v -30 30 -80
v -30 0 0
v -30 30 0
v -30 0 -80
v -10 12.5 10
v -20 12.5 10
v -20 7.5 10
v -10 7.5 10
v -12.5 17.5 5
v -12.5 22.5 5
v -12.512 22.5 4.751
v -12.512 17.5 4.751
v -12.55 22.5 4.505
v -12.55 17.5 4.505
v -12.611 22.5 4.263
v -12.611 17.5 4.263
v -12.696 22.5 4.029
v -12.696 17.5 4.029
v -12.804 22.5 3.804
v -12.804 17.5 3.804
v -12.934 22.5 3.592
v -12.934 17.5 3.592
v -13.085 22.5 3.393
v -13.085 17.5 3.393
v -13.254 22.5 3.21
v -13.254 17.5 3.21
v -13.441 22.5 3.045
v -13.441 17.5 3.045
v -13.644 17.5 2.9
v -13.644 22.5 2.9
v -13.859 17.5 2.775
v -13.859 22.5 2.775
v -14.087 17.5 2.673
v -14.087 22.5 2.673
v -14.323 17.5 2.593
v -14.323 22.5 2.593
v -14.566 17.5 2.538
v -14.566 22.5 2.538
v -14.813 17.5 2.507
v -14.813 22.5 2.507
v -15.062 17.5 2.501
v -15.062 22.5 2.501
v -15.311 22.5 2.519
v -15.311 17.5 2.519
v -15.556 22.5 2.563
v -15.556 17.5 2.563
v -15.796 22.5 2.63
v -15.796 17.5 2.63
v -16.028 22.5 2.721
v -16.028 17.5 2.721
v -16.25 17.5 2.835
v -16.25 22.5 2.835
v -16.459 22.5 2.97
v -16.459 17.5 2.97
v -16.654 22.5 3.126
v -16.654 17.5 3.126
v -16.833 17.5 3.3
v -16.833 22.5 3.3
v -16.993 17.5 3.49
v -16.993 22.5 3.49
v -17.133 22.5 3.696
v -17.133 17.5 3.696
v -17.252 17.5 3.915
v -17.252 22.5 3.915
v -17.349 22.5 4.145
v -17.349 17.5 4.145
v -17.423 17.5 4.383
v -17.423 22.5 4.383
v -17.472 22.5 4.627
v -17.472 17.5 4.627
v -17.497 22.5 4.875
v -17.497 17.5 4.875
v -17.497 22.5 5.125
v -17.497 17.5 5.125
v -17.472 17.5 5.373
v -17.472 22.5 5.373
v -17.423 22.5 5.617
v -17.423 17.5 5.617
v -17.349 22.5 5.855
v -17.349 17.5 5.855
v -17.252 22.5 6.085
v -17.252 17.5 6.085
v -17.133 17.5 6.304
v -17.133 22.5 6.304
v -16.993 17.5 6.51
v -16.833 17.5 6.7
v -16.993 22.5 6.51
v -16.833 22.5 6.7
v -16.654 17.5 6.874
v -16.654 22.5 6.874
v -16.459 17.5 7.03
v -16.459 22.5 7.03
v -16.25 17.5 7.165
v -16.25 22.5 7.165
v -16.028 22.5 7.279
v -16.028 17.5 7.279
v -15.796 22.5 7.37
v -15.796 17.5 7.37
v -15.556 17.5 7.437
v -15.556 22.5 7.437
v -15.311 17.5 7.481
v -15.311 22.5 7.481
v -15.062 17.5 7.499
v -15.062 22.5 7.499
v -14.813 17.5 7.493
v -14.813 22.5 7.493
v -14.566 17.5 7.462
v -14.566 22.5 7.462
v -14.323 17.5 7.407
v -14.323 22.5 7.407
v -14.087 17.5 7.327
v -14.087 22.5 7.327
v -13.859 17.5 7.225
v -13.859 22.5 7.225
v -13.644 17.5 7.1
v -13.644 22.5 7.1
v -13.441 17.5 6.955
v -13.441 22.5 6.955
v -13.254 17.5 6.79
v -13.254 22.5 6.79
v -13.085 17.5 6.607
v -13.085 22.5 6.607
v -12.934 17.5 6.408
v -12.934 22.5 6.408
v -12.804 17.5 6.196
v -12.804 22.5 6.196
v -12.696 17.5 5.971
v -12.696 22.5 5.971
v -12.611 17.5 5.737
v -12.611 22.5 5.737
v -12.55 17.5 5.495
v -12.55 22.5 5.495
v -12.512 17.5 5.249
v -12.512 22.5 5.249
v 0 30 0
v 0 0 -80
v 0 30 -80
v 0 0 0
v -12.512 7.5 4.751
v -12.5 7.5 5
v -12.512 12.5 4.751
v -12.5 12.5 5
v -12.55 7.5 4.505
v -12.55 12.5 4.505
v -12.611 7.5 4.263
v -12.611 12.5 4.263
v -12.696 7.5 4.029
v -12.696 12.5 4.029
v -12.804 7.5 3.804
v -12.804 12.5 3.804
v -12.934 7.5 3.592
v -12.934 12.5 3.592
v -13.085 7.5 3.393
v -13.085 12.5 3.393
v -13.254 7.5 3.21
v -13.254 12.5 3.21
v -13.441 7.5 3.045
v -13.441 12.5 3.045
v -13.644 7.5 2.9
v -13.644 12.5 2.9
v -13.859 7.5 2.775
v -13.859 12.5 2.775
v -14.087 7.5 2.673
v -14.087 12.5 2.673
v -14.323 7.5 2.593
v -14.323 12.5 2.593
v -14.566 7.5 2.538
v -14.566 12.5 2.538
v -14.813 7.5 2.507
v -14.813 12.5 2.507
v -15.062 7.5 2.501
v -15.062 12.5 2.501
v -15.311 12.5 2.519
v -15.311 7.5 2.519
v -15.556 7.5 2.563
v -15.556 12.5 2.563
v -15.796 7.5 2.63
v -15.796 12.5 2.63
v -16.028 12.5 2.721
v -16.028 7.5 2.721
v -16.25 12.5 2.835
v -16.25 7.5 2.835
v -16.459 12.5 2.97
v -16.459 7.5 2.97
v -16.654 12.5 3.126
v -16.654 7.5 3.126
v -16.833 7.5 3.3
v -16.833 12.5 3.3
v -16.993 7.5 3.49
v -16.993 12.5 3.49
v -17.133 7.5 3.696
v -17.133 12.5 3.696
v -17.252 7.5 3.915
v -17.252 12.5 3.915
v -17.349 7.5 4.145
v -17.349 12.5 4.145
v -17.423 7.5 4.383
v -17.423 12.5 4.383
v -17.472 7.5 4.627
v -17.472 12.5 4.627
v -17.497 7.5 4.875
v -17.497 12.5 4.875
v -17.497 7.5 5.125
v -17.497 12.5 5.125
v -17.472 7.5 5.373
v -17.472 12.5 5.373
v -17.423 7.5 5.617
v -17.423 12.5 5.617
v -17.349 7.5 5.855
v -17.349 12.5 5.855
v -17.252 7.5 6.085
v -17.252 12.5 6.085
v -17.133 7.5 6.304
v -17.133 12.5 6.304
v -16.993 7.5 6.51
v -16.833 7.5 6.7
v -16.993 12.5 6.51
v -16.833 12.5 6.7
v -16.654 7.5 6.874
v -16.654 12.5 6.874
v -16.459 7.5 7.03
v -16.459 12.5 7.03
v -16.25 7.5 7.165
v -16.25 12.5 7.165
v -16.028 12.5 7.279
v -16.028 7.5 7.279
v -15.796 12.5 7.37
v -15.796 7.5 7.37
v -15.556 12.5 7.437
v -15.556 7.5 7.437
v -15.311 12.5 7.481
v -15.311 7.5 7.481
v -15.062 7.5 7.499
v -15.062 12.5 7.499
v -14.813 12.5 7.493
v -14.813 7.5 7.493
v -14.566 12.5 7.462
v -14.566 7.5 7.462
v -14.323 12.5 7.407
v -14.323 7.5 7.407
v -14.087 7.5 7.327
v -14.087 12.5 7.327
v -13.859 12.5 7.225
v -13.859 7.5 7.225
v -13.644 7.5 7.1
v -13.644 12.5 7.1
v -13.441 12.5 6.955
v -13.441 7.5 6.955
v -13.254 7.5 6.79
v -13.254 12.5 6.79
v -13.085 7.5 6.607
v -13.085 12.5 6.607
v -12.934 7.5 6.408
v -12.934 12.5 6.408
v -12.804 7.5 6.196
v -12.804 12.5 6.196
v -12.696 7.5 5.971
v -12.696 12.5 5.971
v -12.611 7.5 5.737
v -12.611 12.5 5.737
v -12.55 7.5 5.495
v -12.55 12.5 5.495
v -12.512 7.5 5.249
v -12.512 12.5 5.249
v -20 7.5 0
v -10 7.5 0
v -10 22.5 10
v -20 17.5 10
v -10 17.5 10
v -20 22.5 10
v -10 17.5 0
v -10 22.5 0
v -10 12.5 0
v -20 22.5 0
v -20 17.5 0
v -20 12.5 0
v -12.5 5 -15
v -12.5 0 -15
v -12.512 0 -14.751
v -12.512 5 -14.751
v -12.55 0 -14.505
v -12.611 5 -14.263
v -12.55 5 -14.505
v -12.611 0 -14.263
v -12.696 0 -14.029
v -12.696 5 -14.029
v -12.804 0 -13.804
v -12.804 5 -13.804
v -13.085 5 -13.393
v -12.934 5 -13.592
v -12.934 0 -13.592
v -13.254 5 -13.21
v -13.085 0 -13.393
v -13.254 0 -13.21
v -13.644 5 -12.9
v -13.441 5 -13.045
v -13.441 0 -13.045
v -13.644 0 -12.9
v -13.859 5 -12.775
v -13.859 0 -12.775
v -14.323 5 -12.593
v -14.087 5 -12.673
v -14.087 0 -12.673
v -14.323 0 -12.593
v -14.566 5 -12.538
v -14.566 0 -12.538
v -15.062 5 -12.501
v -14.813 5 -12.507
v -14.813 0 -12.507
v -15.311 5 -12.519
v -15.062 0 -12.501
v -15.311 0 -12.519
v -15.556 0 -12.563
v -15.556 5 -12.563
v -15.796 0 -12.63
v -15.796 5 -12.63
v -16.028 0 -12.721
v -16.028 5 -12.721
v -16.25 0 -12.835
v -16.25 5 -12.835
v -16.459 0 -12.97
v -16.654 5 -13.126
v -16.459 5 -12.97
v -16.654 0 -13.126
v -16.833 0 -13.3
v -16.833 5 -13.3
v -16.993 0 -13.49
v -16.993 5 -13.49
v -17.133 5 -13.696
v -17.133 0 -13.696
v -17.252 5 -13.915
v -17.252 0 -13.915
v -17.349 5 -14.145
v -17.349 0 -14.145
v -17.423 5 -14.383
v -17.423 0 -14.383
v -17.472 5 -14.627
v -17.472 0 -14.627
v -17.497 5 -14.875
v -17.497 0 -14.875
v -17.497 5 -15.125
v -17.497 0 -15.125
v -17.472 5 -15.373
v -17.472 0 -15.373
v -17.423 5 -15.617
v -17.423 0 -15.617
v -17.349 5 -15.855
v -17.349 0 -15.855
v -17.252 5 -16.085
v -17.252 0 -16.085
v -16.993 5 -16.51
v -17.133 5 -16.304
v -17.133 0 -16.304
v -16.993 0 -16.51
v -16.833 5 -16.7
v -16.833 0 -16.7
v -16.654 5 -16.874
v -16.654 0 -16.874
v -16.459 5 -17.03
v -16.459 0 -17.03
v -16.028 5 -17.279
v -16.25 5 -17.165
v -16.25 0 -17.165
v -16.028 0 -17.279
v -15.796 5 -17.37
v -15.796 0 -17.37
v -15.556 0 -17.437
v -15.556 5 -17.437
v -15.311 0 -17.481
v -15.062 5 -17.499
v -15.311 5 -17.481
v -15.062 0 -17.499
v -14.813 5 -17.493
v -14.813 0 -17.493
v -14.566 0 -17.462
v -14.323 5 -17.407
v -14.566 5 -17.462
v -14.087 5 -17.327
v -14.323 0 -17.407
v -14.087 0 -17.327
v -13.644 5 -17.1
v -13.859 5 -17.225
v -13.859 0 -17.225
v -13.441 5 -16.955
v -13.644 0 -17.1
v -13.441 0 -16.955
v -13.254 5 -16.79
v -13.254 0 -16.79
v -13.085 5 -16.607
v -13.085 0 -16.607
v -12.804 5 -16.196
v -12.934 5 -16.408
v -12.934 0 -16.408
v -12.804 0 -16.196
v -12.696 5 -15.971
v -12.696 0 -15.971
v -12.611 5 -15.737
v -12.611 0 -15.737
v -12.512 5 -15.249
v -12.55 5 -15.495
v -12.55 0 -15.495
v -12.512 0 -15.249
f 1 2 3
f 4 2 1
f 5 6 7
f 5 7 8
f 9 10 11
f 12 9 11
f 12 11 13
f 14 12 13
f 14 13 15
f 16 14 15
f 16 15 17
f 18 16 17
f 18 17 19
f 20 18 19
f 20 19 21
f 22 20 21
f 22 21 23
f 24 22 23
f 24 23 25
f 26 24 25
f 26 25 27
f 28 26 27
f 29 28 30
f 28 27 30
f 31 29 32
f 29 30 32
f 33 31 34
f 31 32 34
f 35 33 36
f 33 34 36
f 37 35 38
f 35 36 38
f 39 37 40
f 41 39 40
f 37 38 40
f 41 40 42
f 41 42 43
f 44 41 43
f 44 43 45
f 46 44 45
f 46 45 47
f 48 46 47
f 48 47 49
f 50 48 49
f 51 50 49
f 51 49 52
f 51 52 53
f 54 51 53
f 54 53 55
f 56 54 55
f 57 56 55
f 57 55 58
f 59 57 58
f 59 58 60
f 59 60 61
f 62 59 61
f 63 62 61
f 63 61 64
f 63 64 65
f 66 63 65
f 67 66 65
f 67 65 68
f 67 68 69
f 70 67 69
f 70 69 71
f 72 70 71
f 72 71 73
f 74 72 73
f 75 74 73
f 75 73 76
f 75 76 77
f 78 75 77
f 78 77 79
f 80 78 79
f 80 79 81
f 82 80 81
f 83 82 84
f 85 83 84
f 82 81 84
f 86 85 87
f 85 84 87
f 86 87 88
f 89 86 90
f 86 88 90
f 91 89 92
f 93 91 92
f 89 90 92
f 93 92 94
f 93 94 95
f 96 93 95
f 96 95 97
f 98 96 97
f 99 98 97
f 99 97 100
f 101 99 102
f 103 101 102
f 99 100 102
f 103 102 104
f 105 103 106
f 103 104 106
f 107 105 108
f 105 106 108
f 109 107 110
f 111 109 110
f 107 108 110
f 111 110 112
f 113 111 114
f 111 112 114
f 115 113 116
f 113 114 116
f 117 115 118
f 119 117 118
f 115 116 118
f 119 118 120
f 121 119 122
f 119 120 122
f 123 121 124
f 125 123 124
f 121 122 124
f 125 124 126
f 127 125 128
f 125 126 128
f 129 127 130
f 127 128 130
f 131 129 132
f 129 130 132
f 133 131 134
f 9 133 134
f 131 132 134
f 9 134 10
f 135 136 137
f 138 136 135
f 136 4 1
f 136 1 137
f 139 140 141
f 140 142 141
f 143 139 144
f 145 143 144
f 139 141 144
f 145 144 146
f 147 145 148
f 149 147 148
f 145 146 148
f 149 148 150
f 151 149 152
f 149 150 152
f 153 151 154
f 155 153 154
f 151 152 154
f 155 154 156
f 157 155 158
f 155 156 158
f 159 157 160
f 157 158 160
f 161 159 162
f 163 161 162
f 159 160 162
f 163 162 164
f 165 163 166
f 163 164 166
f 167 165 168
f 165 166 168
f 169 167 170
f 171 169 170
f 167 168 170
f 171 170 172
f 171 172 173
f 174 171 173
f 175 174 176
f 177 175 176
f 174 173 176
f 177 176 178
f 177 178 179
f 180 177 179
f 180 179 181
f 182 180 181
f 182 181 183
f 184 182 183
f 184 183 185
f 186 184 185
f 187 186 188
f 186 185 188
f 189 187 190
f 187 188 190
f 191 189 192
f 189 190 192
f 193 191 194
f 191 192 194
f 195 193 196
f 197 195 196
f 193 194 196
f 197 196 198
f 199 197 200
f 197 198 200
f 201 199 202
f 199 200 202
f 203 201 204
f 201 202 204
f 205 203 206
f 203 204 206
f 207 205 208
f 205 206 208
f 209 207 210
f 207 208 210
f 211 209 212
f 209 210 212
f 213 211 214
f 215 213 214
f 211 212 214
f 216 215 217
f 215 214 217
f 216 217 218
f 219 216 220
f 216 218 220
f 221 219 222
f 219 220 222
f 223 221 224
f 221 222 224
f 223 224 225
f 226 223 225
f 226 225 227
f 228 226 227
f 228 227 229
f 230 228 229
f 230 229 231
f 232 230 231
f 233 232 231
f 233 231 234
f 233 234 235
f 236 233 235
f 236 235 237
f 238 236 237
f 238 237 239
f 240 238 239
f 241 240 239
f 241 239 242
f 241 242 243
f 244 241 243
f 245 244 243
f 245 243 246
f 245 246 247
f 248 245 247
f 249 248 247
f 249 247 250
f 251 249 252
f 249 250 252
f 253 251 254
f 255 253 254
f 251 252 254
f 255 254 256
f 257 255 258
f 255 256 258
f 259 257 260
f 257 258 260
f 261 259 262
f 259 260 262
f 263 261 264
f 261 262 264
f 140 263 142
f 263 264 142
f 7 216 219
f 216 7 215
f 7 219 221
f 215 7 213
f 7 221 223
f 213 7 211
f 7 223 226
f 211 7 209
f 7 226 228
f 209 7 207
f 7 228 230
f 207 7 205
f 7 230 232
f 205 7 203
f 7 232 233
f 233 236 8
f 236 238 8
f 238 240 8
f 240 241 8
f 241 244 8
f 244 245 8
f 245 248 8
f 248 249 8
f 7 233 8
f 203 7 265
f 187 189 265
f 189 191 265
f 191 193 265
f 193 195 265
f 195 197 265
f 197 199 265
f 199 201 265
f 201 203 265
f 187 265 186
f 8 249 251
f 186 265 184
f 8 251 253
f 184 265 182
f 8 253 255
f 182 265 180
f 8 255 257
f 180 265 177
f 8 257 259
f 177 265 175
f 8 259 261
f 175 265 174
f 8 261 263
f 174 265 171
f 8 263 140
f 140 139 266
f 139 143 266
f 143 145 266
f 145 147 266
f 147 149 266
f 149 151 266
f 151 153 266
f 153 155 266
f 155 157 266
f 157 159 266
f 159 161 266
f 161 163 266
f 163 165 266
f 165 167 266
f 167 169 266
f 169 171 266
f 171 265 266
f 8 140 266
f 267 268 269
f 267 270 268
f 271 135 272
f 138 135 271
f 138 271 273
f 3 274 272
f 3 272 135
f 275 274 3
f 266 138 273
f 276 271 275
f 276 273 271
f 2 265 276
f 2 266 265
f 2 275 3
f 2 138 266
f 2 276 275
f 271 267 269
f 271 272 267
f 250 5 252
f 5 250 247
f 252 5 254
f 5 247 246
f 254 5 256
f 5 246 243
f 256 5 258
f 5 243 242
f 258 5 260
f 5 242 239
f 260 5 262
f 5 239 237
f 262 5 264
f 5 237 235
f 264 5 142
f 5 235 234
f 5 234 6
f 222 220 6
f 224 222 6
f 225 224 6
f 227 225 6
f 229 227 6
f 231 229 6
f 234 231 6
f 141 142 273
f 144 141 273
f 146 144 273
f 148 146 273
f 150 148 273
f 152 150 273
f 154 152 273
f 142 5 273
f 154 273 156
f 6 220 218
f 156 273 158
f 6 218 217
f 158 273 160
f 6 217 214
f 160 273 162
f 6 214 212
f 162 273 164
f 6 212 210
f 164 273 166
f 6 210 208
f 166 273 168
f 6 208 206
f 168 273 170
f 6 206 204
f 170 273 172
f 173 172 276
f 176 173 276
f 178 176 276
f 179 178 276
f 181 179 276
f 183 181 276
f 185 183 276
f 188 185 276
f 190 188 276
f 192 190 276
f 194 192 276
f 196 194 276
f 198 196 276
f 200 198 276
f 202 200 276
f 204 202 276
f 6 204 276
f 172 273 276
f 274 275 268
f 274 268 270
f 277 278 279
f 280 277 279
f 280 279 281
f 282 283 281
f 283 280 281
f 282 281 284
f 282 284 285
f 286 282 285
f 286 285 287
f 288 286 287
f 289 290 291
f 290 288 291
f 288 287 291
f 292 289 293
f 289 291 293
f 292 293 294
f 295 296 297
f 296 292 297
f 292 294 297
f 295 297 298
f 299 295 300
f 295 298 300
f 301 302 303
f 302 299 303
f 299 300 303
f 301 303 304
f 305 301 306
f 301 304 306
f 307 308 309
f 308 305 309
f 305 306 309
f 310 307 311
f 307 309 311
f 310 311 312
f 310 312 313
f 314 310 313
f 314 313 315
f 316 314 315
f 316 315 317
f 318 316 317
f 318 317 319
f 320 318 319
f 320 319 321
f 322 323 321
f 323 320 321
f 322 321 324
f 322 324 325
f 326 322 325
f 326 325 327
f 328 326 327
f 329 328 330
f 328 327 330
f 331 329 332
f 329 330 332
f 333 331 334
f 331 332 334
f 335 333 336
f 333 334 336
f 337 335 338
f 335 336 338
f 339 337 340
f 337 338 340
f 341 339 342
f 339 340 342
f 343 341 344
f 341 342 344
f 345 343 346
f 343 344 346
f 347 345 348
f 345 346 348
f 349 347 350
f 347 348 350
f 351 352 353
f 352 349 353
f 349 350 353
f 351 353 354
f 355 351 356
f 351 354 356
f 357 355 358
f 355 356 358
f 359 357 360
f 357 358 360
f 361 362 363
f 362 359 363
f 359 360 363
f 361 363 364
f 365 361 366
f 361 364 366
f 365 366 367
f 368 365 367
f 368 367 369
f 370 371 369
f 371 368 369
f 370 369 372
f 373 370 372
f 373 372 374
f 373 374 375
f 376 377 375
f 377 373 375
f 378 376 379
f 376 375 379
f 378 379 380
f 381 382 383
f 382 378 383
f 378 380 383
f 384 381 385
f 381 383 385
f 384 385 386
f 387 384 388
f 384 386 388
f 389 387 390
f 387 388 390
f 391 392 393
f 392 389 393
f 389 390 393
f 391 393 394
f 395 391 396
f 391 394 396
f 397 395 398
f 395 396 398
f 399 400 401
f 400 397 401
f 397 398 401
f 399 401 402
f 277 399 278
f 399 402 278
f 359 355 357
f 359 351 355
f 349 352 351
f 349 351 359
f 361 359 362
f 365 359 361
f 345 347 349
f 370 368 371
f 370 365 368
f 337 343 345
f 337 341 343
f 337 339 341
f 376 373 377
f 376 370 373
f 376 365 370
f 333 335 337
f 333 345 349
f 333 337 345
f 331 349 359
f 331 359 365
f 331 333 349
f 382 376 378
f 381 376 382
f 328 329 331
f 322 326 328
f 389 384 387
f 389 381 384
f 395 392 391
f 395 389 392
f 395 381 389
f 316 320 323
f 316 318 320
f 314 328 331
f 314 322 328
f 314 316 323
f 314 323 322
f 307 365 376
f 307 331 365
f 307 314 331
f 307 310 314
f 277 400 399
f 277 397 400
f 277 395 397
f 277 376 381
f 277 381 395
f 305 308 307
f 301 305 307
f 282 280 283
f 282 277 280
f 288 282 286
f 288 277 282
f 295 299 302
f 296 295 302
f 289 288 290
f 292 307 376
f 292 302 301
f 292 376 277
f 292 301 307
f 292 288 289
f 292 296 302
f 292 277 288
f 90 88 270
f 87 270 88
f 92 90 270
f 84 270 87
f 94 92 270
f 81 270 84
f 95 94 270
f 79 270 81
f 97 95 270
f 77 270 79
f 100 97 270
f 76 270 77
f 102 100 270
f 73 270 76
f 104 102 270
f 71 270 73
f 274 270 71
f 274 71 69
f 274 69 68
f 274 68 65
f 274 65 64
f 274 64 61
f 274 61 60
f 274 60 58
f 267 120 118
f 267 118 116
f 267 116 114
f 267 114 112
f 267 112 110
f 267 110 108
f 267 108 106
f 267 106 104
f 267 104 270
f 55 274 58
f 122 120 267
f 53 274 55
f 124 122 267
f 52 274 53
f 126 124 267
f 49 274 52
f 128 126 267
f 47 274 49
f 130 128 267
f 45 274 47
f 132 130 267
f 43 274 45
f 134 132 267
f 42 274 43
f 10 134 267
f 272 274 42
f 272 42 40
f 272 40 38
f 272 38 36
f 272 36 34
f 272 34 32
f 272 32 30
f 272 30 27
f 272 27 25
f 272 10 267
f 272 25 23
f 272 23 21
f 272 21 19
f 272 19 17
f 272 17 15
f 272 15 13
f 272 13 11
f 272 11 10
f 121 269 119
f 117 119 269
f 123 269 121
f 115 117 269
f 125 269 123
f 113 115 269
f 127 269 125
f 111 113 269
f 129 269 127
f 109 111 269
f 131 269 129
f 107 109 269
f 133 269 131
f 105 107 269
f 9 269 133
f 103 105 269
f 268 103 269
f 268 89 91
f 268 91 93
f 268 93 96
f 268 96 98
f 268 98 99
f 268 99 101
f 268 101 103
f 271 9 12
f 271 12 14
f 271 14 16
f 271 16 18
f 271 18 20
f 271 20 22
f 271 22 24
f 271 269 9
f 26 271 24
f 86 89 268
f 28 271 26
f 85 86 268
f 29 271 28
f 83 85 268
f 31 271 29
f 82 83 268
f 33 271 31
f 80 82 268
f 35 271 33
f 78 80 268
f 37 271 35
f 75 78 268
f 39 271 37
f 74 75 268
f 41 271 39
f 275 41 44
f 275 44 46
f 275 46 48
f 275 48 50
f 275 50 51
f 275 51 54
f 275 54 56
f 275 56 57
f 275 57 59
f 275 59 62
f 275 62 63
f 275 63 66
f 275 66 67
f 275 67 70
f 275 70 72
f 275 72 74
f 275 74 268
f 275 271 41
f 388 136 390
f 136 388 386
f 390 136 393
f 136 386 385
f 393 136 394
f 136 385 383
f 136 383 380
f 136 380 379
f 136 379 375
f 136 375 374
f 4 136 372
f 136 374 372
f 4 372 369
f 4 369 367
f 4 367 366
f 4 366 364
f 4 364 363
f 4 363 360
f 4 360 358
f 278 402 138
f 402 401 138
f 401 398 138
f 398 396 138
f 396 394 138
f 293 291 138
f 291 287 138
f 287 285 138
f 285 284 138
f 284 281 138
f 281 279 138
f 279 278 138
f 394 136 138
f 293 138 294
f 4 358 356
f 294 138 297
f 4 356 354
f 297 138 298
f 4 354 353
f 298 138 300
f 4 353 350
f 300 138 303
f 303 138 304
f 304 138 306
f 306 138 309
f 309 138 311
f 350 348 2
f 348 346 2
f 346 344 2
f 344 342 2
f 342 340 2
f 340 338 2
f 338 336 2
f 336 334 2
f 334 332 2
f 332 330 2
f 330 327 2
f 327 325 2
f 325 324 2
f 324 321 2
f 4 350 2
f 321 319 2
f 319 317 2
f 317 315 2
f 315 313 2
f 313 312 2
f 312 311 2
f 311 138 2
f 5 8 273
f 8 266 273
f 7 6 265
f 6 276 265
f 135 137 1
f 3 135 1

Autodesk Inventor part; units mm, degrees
ref_plane "YZ Plane" through (0, 0, 0) normal (1, 0, 0) x (0, 1, 0)
ref_plane "XZ Plane" through (0, 0, 0) normal (0, 1, 0) x (-1, 0, 0)
ref_plane "XY Plane" through (0, 0, 0) normal (0, 0, 1) x (1, 0, 0)
sketch "Sketch1" plane through (0, 0, 0) normal (0, 1, 0) x (-1, 0, 0)
  line L0 (0, 0) -> (30, 0)
  line L1 (30, 0) -> (30, -80)
  line L2 (30, -80) -> (0, -80)
  line L3 (0, -80) -> (0, 0)
  dimension "d0" = 30
  dimension "d1" = 80
extrude "Extrusion1" add sketch "Sketch1" along normal blind 30
sketch "Sketch2" plane through (-30, 0, 0) normal (0, 0, 1) x (1, 0, 0)
  line L0 (30, 0) -> (0, 0) projected
  line L1 (15, 0) -> (15, 7.5)
  line L2 (15, 7.5) -> (20, 7.5)
  line L3 (20, 7.5) -> (20, 12.5)
  line L4 (20, 12.5) -> (15, 12.5)
  line L5 (15, 12.5) -> (15, 7.5)
  line L6 (15, 12.5) -> (10, 12.5)
  line L7 (10, 12.5) -> (10, 7.5)
  line L8 (10, 7.5) -> (15, 7.5)
  line L9 (15, 7.5) -> (15, 12.5)
  line L10 (10, 12.5) -> (20, 12.5)
  line L11 (20, 12.5) -> (20, 17.5)
  line L12 (20, 17.5) -> (10, 17.5)
  line L13 (10, 17.5) -> (10, 12.5)
  line L14 (20, 17.5) -> (10, 17.5)
  line L15 (10, 17.5) -> (10, 22.5)
  line L16 (10, 22.5) -> (20, 22.5)
  line L17 (20, 22.5) -> (20, 17.5)
  dimension "d4" = 7.5
  dimension "d5" = 5
  dimension "d6" = 5
  dimension "d7" = 5
  dimension "d8" = 5
  dimension "d9" = 5
  dimension "d10" = 5
extrude "Extrusion2" add sketch "Sketch2" along normal blind 10 contours L5 L4 L3 L2 | L8 L7 L6 L5 | L12 L15 L16 L17
sketch "Sketch3" plane through (-20, 22.5, 0) normal (0, 1, 0) x (1, 0, 0)
  line L0 (0, 0) -> (0, -10) projected
  line L1 (0, -5) -> (10, -5)
  line L2 (10, 0) -> (10, -10) projected
  circle A0 centre (5, -5) radius 2.5
  point P0 (20, 0)
  dimension "d13" = 5
extrude "Extrusion3" cut sketch "Sketch3" against normal through all
sketch "Sketch4" plane through (0, 0, 0) normal (0, -1, 0) x (1, 0, 0)
  line L0 (-10, 0) -> (-20, 0) projected
  line L1 (-15, 0) -> (-15, -15)
  circle A0 centre (-15, -15) radius 2.5
  point P0 (0, 0)
  dimension "d16" = 15
  dimension "d17" = 5
extrude "Extrusion4" cut sketch "Sketch4" against normal blind 5
properties part number "tail"
